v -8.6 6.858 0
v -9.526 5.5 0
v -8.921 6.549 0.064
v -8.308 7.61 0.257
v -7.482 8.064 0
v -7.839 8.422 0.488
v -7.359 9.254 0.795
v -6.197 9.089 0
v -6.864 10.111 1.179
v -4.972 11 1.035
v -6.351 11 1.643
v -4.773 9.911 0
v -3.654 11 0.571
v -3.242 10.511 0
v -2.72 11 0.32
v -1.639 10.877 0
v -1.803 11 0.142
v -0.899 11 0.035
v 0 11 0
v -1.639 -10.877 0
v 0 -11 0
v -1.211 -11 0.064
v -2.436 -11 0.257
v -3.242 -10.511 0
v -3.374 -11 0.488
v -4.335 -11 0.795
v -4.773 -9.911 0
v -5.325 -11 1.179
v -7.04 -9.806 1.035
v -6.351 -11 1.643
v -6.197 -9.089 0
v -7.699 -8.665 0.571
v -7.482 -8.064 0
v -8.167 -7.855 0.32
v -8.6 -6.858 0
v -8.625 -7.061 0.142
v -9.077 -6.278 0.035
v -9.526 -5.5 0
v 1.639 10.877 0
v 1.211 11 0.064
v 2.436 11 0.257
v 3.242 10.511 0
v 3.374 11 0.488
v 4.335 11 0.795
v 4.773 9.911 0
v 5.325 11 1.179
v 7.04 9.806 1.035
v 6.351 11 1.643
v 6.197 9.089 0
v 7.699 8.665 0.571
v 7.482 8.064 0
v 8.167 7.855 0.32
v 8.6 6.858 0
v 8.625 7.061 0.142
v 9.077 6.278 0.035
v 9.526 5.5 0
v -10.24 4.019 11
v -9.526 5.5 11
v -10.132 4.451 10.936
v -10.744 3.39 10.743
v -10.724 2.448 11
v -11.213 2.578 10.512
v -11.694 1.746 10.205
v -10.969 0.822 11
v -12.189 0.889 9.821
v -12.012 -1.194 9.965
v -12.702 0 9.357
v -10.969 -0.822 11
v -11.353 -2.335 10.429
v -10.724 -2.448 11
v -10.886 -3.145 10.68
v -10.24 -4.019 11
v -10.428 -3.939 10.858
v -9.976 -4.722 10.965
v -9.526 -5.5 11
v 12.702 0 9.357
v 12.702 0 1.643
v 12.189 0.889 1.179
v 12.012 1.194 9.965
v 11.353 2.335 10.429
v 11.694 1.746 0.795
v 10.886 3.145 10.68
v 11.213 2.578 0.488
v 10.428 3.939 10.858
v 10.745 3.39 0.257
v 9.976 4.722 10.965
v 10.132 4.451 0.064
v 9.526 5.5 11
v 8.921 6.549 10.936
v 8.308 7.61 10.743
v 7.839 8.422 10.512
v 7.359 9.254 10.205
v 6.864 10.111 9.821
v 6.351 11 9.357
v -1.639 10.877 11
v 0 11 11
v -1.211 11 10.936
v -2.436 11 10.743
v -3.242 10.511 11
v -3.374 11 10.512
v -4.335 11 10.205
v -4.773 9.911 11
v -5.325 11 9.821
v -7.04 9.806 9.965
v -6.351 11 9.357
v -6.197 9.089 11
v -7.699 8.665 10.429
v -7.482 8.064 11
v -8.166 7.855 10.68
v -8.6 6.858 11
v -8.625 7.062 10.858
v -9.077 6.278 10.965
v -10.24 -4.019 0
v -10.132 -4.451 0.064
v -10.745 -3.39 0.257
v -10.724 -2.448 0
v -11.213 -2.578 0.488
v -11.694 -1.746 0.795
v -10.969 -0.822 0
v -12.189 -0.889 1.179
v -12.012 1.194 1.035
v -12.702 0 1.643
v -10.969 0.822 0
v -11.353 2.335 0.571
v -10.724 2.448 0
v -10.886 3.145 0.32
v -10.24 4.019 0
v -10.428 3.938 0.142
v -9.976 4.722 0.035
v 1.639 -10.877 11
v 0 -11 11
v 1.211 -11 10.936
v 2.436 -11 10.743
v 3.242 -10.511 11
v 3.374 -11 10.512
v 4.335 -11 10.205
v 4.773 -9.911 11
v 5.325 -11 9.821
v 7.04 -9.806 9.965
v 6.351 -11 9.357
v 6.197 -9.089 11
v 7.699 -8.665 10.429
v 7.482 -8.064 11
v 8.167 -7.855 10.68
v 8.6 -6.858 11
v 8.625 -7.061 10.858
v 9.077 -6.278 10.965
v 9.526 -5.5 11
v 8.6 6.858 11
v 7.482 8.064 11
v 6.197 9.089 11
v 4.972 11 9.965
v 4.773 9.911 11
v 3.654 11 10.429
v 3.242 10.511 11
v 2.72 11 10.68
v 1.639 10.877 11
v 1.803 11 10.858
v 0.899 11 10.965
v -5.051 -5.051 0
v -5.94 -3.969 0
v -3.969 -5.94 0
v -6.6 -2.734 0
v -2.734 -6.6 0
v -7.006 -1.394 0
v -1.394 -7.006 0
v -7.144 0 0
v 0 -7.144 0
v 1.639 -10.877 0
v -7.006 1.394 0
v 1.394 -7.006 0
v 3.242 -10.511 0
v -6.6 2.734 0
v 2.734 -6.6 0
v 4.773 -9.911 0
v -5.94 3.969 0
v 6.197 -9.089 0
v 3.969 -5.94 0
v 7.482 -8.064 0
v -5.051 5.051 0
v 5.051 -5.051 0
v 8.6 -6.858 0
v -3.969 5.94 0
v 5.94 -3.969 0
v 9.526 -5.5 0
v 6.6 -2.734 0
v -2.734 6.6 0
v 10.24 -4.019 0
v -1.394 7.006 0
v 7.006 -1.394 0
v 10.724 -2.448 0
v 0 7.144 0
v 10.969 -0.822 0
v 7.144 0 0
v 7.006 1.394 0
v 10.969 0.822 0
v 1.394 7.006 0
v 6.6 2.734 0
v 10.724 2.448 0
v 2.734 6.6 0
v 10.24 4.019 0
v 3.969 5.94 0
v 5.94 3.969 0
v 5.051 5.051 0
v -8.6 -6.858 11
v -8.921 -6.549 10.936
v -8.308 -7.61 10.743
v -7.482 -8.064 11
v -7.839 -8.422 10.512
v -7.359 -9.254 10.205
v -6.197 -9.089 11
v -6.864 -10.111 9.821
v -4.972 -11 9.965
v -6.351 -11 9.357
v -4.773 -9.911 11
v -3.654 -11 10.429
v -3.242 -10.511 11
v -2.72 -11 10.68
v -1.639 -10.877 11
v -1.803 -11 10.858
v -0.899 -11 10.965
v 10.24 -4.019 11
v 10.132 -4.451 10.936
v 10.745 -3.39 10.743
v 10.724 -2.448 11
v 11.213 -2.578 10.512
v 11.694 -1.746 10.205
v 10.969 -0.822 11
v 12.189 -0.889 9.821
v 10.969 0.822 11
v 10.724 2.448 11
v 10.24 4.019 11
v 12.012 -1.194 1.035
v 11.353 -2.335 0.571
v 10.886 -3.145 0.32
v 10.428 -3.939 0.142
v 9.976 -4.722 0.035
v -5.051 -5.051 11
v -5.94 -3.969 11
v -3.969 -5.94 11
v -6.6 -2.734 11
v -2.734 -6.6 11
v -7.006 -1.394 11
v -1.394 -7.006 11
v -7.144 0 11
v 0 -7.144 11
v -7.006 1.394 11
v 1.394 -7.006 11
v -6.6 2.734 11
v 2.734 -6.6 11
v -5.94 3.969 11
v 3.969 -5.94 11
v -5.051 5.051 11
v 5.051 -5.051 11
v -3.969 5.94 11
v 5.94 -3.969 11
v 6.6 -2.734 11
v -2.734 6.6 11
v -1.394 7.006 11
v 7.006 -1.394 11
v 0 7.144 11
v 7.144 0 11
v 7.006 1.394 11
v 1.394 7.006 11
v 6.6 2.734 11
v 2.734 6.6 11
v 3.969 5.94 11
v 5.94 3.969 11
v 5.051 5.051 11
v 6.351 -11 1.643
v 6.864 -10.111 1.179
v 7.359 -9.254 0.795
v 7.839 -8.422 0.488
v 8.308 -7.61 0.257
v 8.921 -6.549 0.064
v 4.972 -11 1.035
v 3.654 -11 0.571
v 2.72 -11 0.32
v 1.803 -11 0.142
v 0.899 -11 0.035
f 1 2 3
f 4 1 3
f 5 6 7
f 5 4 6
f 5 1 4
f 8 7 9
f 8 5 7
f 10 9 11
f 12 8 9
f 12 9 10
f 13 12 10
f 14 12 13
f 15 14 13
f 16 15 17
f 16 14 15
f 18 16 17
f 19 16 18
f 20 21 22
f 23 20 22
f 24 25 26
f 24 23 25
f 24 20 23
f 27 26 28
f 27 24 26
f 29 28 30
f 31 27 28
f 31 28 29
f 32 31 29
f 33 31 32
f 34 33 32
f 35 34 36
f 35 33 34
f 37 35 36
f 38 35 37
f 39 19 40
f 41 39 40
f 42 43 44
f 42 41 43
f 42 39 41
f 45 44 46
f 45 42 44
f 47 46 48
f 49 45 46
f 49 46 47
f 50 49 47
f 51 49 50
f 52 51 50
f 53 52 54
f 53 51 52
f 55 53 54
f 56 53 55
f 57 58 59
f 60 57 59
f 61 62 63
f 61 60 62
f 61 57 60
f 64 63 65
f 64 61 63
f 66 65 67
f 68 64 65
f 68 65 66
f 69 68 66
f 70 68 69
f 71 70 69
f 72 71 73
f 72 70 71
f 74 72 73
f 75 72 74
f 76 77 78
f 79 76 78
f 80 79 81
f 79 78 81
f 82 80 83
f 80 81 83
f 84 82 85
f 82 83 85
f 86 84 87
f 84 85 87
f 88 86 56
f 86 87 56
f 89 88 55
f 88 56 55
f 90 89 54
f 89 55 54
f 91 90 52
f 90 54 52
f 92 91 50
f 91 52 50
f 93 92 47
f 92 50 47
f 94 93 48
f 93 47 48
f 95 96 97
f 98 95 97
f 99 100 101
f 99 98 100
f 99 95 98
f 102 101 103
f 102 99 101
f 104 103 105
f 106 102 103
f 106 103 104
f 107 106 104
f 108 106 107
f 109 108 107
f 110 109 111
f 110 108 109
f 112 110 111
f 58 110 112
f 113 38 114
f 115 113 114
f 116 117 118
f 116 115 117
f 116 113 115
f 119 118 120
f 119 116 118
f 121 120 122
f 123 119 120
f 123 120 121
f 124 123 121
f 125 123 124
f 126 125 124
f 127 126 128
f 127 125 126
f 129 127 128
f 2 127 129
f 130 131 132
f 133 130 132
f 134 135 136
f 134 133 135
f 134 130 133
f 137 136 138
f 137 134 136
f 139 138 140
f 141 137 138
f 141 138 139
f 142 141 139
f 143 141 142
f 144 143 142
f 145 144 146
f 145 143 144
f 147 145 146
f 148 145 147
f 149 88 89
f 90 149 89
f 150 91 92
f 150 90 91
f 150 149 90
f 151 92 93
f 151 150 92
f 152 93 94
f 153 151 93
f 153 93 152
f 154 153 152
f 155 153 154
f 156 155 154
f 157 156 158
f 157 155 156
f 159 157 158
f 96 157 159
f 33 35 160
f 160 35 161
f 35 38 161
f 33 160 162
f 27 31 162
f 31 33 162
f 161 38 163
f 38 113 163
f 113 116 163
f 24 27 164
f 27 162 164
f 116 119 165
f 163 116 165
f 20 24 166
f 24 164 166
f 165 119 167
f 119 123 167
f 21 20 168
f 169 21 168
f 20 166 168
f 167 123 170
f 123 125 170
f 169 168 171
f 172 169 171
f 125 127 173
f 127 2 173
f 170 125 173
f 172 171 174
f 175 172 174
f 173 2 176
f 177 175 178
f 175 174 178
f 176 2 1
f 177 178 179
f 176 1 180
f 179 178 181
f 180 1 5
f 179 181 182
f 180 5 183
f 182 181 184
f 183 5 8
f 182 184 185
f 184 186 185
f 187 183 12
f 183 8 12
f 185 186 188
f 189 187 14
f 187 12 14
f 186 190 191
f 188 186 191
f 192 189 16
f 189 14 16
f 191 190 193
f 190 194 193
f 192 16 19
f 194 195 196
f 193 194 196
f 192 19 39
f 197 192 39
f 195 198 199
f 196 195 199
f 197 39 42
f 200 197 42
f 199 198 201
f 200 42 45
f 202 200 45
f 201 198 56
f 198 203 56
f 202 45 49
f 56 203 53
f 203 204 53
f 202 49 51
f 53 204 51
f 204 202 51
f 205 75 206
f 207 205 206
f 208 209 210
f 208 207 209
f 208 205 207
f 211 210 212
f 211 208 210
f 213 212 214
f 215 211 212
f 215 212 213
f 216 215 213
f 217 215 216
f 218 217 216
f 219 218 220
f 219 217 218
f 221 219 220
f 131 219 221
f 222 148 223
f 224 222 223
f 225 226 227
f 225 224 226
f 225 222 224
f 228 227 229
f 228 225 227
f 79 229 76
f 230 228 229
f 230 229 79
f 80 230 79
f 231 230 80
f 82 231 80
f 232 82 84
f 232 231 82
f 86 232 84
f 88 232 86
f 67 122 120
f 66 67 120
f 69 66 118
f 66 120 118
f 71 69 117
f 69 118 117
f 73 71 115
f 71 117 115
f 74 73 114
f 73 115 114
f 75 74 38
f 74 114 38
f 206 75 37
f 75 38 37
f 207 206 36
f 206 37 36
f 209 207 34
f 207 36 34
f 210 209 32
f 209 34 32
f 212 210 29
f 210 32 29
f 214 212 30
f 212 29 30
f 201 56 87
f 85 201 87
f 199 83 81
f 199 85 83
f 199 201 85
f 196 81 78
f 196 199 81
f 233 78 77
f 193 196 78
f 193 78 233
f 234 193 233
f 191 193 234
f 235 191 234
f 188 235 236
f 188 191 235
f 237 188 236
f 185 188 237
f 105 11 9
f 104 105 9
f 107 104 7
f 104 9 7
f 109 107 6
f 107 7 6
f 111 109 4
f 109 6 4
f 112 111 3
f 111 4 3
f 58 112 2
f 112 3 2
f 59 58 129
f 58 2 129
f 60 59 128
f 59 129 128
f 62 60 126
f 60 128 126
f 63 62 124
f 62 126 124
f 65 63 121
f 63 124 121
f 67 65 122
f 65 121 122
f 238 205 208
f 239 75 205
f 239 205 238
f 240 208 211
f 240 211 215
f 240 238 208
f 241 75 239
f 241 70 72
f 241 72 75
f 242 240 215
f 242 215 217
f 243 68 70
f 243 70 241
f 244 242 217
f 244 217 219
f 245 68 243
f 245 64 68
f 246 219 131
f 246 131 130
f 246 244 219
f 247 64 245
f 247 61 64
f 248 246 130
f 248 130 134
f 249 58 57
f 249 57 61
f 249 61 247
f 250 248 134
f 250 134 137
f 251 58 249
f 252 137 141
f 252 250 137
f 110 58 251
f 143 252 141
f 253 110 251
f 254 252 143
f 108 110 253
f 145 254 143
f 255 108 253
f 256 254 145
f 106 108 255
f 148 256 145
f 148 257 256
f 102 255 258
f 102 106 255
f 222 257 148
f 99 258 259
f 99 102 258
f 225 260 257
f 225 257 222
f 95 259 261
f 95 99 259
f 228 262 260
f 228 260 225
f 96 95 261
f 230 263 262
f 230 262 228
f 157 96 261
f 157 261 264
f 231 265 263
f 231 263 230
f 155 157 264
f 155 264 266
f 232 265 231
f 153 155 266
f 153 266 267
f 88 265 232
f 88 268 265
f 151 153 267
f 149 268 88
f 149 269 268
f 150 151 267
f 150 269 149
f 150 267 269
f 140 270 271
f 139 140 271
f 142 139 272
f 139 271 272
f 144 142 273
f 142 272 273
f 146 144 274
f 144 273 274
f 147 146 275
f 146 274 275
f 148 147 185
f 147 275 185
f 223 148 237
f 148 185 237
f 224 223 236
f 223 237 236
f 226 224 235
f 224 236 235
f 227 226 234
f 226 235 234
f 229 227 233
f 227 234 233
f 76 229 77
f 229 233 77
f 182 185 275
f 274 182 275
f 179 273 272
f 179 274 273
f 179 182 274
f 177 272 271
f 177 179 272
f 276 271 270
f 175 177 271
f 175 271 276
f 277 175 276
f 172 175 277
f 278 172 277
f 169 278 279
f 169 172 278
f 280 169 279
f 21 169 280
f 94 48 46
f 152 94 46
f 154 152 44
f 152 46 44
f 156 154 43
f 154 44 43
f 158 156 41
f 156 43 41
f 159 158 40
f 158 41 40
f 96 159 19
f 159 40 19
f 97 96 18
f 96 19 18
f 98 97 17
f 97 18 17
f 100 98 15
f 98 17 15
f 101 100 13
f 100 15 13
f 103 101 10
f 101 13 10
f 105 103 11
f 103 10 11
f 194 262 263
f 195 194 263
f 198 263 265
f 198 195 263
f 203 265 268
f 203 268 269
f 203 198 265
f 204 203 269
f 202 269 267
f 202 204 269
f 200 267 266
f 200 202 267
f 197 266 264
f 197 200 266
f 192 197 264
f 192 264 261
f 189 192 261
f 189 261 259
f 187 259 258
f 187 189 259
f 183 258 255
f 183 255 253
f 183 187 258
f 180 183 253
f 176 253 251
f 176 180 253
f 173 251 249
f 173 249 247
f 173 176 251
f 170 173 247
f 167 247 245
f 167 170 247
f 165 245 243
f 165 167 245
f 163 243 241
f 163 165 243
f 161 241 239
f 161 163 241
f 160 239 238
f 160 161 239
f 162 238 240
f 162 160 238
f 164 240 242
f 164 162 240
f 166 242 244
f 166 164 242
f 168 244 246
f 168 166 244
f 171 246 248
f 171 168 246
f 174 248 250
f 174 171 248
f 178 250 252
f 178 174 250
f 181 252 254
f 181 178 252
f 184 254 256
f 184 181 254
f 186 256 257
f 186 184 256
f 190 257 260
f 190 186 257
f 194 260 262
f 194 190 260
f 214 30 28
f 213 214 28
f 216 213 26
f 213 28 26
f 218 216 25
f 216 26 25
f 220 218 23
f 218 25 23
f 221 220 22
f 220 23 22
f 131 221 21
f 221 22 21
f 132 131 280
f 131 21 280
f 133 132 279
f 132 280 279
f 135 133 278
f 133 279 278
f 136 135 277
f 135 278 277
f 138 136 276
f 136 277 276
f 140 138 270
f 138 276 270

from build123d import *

# Parameters (mm, degrees)
CROQUIS1_R              = 7.14375
SALIENTE_EXTRUIR1_DEPTH = 11
CROQUIS2_R              = 31.223063066
CROQUIS2_R_2            = 11
CORTAR_EXTRUIR1_DEPTH   = 10
CORTAR_EXTRUIR1_DRAFT   = -46
CROQUIS4_R              = 40.862675885
CROQUIS4_R_2            = 11
CORTAR_EXTRUIR3_DEPTH   = 10
CORTAR_EXTRUIR3_DRAFT   = -46


with BuildPart() as part:
    # Croquis1 → Saliente-Extruir1 (new body)
    with BuildSketch(Plane.XY):
        Polygon((12.701705922, 0), (6.350852961, 11), (-6.350852961, 11), (-12.701705922, 0), (-6.350852961, -11), (6.350852961, -11), align=None)
        Circle(CROQUIS1_R, mode=Mode.SUBTRACT)
    extrude(amount=SALIENTE_EXTRUIR1_DEPTH)


with BuildPart() as cortar_extruir1_tool:
    # Croquis2 → Cortar-Extruir1 (with draft: the straight prism first)
    with BuildSketch(Plane.XY.offset(11)):
        Circle(CROQUIS2_R)
        Circle(CROQUIS2_R_2, mode=Mode.SUBTRACT)
    extrude(amount=-CORTAR_EXTRUIR1_DEPTH)
    # Cortar-Extruir1: the draft: its side faces are tilted about the plane it starts from
    cortar_extruir1_sides = [cortar_extruir1_tool.faces().sort_by_distance(p)[0] for p in [
        (-31.223063066, 0, 6),
        (-11, 0, 6),
    ]]
    draft(cortar_extruir1_sides, Plane.XY.offset(11), CORTAR_EXTRUIR1_DRAFT)


with BuildPart() as part_1:
    add(part.part)

    # Cortar-Extruir1: cut by cortar_extruir1_tool
    add(cortar_extruir1_tool.part, mode=Mode.SUBTRACT)


with BuildPart() as cortar_extruir3_tool:
    # Croquis4 → Cortar-Extruir3 (with draft: the straight prism first)
    with BuildSketch(Plane(origin=(0, 0, 0), x_dir=(-1, 0, 0), z_dir=(0, 0, -1))):
        Circle(CROQUIS4_R)
        Circle(CROQUIS4_R_2, mode=Mode.SUBTRACT)
    extrude(amount=-CORTAR_EXTRUIR3_DEPTH)
    # Cortar-Extruir3: the draft: its side faces are tilted about the plane it starts from
    cortar_extruir3_sides = [cortar_extruir3_tool.faces().sort_by_distance(p)[0] for p in [
        (40.862675885, 0, 5),
        (11, 0, 5),
    ]]
    draft(cortar_extruir3_sides, Plane(origin=(0, 0, 0), x_dir=(-1, 0, 0), z_dir=(0, 0, -1)), CORTAR_EXTRUIR3_DRAFT)


with BuildPart() as part_2:
    add(part_1.part)

    # Cortar-Extruir3: cut by cortar_extruir3_tool
    add(cortar_extruir3_tool.part, mode=Mode.SUBTRACT)


solid = part_2.part
